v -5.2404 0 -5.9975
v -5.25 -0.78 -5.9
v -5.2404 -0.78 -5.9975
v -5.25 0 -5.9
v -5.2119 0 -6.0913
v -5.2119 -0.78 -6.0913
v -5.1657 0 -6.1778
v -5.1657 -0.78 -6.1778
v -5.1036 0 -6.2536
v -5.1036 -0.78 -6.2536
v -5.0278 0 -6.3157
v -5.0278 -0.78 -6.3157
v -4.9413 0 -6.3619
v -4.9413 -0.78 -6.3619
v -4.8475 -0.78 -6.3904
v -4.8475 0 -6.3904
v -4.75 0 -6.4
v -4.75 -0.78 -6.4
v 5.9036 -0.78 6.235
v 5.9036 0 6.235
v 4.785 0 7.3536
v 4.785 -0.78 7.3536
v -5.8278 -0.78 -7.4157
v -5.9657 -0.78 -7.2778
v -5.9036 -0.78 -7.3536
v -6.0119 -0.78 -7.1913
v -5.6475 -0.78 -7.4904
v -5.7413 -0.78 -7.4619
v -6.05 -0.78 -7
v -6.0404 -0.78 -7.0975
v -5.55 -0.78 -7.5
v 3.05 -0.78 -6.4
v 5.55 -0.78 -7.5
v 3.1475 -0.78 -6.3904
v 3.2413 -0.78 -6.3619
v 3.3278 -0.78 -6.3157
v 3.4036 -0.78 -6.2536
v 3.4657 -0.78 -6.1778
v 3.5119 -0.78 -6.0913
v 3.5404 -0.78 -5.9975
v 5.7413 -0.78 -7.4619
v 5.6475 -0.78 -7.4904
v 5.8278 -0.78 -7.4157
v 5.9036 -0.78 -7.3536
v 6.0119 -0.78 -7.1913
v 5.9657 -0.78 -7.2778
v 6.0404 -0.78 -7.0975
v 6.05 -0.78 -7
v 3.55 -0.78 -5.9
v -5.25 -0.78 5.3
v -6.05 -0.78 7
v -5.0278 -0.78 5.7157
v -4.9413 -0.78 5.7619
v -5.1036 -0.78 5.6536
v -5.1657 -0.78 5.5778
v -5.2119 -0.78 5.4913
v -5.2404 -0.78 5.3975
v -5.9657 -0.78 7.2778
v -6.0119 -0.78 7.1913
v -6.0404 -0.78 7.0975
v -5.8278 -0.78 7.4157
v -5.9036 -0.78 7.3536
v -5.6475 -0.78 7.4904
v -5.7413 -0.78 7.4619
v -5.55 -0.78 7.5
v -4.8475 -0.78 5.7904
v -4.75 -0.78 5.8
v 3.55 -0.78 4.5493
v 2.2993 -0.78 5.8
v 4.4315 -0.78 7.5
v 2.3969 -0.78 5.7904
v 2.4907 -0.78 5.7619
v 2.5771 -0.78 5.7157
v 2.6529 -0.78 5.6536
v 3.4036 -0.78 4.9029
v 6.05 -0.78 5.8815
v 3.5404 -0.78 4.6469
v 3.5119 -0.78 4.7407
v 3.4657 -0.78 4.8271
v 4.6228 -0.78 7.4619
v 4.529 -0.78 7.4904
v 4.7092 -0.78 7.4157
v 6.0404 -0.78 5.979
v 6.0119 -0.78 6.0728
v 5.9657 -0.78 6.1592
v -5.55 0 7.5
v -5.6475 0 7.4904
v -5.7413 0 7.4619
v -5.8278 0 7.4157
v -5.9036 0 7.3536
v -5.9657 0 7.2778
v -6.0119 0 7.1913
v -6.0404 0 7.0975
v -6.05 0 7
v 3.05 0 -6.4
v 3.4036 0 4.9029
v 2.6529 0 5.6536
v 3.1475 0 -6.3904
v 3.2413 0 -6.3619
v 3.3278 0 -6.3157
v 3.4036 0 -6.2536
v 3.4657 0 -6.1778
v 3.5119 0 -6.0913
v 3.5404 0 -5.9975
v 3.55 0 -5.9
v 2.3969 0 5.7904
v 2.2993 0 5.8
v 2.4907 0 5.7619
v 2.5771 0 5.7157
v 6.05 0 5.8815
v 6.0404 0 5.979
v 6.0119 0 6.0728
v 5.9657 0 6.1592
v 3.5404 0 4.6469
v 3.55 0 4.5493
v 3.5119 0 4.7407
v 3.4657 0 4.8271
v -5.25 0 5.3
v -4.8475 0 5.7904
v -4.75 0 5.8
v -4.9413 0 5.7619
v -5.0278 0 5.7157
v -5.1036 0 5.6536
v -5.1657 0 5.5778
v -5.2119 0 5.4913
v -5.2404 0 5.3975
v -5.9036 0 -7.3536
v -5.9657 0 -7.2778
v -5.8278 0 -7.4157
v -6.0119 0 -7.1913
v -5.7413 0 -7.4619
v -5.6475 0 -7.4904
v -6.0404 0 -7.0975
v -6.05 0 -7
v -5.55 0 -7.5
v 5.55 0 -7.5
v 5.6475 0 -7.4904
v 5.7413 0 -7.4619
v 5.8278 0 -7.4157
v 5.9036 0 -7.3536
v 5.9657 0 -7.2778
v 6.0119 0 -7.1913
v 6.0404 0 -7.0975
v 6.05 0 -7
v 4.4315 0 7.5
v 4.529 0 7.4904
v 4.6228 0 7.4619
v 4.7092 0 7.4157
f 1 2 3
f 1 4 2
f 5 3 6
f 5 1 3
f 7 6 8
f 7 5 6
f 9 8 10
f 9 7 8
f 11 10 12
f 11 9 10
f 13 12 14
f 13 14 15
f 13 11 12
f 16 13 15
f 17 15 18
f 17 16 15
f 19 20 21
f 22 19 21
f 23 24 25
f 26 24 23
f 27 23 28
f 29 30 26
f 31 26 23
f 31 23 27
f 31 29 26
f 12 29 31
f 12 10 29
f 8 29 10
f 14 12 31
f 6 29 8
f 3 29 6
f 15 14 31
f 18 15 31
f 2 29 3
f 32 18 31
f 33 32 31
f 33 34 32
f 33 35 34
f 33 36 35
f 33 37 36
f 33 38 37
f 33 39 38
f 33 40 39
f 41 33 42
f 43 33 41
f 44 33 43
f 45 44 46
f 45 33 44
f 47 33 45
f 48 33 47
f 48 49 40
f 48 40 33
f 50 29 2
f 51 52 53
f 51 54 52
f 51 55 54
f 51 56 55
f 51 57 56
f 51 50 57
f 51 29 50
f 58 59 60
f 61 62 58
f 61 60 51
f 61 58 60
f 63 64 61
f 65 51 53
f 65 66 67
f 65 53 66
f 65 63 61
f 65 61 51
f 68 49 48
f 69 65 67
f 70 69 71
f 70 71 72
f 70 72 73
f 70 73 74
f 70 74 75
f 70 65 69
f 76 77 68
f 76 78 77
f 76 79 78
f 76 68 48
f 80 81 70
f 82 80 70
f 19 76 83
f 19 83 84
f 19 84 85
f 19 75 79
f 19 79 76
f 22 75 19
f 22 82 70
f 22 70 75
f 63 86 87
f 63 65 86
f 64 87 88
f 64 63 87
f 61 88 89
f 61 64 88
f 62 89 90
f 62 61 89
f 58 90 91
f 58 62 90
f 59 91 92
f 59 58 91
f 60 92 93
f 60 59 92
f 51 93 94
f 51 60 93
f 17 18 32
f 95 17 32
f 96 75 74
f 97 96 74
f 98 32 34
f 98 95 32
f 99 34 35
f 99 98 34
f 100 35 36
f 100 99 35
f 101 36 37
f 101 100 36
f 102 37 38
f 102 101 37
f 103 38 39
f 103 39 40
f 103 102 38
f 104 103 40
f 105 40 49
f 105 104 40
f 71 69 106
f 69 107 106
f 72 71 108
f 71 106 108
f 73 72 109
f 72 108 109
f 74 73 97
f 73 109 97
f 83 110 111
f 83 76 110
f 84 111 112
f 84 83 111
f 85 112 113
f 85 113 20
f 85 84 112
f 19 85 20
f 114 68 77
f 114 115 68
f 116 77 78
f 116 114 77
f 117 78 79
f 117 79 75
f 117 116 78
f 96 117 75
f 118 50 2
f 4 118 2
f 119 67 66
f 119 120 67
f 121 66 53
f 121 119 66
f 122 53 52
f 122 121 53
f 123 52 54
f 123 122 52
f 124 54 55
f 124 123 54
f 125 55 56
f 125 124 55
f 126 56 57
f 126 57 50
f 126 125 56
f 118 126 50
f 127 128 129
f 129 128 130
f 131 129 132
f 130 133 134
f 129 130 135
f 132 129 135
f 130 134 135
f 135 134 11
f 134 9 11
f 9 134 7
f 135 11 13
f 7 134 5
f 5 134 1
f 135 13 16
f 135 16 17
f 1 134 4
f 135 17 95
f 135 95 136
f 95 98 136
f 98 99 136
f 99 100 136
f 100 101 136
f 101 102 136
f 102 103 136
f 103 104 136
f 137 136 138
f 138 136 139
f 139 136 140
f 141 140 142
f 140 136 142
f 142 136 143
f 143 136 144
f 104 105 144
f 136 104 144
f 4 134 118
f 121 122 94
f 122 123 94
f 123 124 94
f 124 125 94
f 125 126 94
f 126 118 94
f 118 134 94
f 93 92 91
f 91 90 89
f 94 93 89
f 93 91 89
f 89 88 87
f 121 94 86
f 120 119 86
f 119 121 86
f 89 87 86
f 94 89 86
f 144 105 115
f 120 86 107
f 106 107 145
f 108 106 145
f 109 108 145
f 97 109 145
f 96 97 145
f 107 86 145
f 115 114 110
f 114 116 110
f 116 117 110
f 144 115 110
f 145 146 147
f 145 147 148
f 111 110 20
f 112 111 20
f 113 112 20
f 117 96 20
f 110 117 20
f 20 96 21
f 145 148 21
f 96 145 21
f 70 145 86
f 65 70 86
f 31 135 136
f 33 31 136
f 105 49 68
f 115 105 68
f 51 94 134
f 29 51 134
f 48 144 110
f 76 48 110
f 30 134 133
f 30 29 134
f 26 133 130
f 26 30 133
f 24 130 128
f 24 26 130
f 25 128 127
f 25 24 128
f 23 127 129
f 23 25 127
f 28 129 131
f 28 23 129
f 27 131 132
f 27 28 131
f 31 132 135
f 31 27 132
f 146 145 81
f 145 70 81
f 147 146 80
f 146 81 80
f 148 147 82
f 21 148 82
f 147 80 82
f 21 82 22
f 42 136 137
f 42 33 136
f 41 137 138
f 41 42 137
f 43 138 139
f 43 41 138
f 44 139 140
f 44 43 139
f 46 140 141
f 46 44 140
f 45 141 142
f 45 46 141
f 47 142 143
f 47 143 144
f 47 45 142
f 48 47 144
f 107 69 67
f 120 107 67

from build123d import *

# Parameters (mm, degrees)
F1_DEPTH = 0.78
F2_R     = 0.5
F4_DEPTH = 25
F5_R     = 0.5


with BuildPart() as f1:
    # F0 (on Front) → F1 (new body)
    with BuildSketch(Plane.XZ):
        Polygon((4.6385581188, 7.5), (-6.05, 7.5), (-6.05, -7.5), (6.05, -7.5), (6.05, 6.0885581188), align=None)
    extrude(amount=F1_DEPTH)

    # F2
    f2_edges = [f1.edges().sort_by_distance(p)[0] for p in [
        (-6.05, -0.39, 7.5),
        (-6.05, -0.39, -7.5),
        (6.05, -0.39, -7.5),
        (4.638558, -0.39, 7.5),
        (6.05, -0.39, 6.088558),
    ]]
    fillet(f2_edges, radius=F2_R)

    # F3 (on face) → F4 (cut)
    with BuildSketch(Plane.XZ.offset(0.78)):
        Polygon((2.5064539127, 5.8), (-5.25, 5.8), (-5.25, -6.4), (3.55, -6.4), (3.55, 4.7564539127), align=None)
    extrude(amount=-F4_DEPTH, mode=Mode.SUBTRACT)

    # F5
    f5_edges = [f1.edges().sort_by_distance(p)[0] for p in [
        (-5.25, -0.39, 5.8),
        (-5.25, -0.39, -6.4),
        (3.55, -0.39, -6.4),
        (3.55, -0.39, 4.756454),
        (2.506454, -0.39, 5.8),
    ]]
    fillet(f5_edges, radius=F5_R)


solid = f1.part
